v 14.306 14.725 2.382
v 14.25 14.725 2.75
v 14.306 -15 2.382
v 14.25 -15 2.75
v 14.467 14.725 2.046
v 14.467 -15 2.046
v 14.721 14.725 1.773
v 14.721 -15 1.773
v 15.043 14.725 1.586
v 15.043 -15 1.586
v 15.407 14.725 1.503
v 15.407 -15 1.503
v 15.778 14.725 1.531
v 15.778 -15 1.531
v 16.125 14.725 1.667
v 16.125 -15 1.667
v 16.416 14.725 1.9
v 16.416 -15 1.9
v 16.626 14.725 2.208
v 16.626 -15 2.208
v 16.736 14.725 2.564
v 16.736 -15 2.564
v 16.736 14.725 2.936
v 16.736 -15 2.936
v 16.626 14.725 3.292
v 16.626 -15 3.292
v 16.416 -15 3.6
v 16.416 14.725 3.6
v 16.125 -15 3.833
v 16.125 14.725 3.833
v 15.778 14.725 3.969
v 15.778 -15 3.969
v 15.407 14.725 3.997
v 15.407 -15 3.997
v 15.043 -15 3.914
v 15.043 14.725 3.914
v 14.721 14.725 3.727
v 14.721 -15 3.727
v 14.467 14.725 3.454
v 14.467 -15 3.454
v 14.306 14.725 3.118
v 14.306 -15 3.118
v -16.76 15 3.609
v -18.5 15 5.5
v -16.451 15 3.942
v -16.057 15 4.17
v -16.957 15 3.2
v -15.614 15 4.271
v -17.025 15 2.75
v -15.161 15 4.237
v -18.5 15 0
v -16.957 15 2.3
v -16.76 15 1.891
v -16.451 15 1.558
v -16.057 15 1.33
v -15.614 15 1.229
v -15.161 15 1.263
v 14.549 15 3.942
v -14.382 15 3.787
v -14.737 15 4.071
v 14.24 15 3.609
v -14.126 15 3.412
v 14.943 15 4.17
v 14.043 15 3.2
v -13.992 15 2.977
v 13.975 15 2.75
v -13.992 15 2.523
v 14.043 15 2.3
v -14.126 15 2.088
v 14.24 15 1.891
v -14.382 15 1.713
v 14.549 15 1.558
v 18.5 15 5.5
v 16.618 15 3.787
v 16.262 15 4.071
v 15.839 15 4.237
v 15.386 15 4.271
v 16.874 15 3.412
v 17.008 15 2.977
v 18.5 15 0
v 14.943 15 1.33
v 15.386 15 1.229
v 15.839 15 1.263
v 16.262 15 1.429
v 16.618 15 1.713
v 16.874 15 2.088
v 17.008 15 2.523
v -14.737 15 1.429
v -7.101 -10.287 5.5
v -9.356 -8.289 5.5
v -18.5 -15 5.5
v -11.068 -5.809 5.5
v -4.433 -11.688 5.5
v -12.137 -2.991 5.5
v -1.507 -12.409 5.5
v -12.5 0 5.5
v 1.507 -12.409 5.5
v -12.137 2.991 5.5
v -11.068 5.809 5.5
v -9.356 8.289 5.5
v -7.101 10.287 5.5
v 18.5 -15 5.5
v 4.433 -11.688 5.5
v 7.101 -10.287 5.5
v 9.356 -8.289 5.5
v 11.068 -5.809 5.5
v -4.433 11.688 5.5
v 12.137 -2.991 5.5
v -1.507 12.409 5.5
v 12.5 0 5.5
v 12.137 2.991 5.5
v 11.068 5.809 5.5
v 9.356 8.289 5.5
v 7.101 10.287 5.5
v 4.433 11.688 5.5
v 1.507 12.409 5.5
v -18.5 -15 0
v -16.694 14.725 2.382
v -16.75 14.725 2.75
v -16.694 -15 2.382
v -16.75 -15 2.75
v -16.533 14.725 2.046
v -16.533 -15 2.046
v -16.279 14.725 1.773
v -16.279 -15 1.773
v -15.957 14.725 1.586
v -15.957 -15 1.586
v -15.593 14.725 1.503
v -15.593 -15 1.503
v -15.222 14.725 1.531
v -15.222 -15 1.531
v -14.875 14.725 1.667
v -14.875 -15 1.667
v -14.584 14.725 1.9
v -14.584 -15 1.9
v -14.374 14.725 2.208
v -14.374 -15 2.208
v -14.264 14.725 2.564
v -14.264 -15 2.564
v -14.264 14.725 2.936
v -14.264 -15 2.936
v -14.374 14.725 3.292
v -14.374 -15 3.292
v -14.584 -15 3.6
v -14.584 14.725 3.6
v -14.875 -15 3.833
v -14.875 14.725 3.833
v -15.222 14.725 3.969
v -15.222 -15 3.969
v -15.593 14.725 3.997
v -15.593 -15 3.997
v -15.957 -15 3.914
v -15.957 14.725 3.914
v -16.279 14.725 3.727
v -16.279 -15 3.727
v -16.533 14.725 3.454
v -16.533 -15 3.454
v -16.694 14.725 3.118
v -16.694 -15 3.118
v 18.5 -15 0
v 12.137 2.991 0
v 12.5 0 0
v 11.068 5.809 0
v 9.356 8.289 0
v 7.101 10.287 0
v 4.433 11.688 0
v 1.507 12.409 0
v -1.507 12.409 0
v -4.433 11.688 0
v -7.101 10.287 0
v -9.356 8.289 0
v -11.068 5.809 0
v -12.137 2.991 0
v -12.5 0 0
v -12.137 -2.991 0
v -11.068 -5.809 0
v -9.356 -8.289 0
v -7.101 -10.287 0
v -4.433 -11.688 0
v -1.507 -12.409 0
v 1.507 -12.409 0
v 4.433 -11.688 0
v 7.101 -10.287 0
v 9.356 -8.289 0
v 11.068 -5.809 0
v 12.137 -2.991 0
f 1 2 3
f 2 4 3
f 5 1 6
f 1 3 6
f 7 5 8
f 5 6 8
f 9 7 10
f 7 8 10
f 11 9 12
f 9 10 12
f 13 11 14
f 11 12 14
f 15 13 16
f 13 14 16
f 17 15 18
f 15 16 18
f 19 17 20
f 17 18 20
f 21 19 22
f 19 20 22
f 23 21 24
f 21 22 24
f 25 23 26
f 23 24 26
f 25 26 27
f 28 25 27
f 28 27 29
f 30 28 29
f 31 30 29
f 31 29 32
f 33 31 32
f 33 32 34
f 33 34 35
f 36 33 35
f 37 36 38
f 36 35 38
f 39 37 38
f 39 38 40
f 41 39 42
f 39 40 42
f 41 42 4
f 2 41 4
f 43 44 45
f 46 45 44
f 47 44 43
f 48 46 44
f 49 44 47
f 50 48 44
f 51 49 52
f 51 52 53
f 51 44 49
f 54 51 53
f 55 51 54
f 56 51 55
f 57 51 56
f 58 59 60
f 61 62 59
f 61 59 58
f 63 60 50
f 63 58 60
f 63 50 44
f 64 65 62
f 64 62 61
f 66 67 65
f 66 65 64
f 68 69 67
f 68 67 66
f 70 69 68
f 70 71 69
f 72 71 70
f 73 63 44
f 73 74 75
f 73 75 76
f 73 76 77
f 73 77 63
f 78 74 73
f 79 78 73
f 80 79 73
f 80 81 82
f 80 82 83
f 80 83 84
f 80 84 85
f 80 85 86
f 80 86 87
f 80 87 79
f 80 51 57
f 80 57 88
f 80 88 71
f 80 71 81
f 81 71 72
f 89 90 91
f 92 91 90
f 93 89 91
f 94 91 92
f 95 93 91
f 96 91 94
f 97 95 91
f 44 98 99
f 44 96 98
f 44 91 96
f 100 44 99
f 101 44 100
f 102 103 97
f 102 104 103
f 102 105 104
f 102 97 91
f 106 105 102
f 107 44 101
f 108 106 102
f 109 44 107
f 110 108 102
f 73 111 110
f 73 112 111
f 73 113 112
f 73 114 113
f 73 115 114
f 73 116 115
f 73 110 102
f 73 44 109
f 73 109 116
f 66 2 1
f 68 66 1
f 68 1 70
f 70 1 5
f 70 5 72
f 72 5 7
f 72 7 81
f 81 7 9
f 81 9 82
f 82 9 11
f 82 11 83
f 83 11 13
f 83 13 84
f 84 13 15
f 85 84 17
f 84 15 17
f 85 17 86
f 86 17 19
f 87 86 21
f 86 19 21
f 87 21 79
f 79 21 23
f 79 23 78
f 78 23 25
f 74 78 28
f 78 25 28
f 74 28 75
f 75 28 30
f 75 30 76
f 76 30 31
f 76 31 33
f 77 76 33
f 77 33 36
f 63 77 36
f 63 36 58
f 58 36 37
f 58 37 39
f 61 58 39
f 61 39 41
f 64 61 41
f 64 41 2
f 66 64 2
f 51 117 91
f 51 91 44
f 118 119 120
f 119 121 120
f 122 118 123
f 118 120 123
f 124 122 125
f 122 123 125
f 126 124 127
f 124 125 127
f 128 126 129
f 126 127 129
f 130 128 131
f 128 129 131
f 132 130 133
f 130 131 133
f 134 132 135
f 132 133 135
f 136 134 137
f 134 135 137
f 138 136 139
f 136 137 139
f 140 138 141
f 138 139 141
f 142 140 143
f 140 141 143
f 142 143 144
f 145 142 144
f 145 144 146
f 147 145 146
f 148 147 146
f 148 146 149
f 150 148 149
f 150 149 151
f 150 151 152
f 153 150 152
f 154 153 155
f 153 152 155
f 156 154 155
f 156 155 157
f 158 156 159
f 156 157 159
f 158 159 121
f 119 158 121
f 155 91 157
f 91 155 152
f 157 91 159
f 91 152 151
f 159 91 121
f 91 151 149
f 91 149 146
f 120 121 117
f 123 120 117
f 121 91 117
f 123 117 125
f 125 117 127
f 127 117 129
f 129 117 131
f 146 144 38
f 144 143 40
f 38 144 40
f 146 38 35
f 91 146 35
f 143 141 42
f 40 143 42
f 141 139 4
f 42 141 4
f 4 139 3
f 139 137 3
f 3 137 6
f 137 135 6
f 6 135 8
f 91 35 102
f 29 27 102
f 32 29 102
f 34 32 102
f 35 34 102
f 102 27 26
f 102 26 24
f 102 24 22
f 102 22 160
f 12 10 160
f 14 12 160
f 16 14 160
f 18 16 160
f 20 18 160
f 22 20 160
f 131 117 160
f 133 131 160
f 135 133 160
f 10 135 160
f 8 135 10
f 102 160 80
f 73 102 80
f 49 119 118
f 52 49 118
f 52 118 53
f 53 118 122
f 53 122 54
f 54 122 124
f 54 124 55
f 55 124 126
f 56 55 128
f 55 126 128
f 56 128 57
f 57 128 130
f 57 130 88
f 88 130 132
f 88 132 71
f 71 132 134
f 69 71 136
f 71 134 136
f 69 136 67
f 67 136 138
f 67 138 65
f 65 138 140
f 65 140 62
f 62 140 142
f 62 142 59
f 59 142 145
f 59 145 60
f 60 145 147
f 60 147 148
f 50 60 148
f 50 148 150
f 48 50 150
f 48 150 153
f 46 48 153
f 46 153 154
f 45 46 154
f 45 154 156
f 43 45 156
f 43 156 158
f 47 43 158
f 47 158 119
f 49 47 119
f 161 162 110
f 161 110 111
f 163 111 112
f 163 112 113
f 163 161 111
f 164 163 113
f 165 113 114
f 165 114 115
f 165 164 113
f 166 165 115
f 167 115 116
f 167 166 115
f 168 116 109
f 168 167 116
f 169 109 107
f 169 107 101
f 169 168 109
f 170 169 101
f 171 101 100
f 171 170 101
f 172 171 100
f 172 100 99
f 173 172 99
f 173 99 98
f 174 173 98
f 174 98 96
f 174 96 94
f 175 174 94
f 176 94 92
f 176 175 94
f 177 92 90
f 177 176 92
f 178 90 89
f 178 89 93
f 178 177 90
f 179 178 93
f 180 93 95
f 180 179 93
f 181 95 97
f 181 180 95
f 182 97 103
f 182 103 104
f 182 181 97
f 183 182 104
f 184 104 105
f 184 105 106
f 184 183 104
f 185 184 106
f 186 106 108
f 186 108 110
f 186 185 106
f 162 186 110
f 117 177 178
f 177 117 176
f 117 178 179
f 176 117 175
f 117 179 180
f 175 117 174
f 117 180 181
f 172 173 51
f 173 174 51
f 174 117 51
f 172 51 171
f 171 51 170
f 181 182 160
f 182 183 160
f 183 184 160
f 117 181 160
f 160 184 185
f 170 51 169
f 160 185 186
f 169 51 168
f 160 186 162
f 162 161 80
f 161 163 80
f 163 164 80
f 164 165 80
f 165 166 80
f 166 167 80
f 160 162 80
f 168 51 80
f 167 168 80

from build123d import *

# Parameters (mm, degrees)
SKETCH_1_W                   = 37
SKETCH_1_H                   = 30
SKETCH_1_R                   = 12.5
EXTRUDE_1_DEPTH              = 5.5
HOLE_WIZARD_M3_1_D           = 2.5
HOLE_WIZARD_M3_1_CSINK_D     = 3.05
HOLE_WIZARD_M3_1_CSINK_ANGLE = 90


with BuildPart() as part:
    # 草图1 → 凸台-拉伸1 (new body)
    with BuildSketch(Plane.XY):
        Rectangle(SKETCH_1_W, SKETCH_1_H)
        Circle(SKETCH_1_R, mode=Mode.SUBTRACT)
    extrude(amount=EXTRUDE_1_DEPTH)

    # M3 螺纹孔1 (through all)
    with Locations(Plane(origin=(0, 15, 0), x_dir=(1, 0, 0), z_dir=(0, 1, 0))):
        with Locations((-15.5, -2.75), (15.5, -2.75)):
            CounterSinkHole(HOLE_WIZARD_M3_1_D / 2, HOLE_WIZARD_M3_1_CSINK_D / 2, counter_sink_angle=HOLE_WIZARD_M3_1_CSINK_ANGLE)


solid = part.part
